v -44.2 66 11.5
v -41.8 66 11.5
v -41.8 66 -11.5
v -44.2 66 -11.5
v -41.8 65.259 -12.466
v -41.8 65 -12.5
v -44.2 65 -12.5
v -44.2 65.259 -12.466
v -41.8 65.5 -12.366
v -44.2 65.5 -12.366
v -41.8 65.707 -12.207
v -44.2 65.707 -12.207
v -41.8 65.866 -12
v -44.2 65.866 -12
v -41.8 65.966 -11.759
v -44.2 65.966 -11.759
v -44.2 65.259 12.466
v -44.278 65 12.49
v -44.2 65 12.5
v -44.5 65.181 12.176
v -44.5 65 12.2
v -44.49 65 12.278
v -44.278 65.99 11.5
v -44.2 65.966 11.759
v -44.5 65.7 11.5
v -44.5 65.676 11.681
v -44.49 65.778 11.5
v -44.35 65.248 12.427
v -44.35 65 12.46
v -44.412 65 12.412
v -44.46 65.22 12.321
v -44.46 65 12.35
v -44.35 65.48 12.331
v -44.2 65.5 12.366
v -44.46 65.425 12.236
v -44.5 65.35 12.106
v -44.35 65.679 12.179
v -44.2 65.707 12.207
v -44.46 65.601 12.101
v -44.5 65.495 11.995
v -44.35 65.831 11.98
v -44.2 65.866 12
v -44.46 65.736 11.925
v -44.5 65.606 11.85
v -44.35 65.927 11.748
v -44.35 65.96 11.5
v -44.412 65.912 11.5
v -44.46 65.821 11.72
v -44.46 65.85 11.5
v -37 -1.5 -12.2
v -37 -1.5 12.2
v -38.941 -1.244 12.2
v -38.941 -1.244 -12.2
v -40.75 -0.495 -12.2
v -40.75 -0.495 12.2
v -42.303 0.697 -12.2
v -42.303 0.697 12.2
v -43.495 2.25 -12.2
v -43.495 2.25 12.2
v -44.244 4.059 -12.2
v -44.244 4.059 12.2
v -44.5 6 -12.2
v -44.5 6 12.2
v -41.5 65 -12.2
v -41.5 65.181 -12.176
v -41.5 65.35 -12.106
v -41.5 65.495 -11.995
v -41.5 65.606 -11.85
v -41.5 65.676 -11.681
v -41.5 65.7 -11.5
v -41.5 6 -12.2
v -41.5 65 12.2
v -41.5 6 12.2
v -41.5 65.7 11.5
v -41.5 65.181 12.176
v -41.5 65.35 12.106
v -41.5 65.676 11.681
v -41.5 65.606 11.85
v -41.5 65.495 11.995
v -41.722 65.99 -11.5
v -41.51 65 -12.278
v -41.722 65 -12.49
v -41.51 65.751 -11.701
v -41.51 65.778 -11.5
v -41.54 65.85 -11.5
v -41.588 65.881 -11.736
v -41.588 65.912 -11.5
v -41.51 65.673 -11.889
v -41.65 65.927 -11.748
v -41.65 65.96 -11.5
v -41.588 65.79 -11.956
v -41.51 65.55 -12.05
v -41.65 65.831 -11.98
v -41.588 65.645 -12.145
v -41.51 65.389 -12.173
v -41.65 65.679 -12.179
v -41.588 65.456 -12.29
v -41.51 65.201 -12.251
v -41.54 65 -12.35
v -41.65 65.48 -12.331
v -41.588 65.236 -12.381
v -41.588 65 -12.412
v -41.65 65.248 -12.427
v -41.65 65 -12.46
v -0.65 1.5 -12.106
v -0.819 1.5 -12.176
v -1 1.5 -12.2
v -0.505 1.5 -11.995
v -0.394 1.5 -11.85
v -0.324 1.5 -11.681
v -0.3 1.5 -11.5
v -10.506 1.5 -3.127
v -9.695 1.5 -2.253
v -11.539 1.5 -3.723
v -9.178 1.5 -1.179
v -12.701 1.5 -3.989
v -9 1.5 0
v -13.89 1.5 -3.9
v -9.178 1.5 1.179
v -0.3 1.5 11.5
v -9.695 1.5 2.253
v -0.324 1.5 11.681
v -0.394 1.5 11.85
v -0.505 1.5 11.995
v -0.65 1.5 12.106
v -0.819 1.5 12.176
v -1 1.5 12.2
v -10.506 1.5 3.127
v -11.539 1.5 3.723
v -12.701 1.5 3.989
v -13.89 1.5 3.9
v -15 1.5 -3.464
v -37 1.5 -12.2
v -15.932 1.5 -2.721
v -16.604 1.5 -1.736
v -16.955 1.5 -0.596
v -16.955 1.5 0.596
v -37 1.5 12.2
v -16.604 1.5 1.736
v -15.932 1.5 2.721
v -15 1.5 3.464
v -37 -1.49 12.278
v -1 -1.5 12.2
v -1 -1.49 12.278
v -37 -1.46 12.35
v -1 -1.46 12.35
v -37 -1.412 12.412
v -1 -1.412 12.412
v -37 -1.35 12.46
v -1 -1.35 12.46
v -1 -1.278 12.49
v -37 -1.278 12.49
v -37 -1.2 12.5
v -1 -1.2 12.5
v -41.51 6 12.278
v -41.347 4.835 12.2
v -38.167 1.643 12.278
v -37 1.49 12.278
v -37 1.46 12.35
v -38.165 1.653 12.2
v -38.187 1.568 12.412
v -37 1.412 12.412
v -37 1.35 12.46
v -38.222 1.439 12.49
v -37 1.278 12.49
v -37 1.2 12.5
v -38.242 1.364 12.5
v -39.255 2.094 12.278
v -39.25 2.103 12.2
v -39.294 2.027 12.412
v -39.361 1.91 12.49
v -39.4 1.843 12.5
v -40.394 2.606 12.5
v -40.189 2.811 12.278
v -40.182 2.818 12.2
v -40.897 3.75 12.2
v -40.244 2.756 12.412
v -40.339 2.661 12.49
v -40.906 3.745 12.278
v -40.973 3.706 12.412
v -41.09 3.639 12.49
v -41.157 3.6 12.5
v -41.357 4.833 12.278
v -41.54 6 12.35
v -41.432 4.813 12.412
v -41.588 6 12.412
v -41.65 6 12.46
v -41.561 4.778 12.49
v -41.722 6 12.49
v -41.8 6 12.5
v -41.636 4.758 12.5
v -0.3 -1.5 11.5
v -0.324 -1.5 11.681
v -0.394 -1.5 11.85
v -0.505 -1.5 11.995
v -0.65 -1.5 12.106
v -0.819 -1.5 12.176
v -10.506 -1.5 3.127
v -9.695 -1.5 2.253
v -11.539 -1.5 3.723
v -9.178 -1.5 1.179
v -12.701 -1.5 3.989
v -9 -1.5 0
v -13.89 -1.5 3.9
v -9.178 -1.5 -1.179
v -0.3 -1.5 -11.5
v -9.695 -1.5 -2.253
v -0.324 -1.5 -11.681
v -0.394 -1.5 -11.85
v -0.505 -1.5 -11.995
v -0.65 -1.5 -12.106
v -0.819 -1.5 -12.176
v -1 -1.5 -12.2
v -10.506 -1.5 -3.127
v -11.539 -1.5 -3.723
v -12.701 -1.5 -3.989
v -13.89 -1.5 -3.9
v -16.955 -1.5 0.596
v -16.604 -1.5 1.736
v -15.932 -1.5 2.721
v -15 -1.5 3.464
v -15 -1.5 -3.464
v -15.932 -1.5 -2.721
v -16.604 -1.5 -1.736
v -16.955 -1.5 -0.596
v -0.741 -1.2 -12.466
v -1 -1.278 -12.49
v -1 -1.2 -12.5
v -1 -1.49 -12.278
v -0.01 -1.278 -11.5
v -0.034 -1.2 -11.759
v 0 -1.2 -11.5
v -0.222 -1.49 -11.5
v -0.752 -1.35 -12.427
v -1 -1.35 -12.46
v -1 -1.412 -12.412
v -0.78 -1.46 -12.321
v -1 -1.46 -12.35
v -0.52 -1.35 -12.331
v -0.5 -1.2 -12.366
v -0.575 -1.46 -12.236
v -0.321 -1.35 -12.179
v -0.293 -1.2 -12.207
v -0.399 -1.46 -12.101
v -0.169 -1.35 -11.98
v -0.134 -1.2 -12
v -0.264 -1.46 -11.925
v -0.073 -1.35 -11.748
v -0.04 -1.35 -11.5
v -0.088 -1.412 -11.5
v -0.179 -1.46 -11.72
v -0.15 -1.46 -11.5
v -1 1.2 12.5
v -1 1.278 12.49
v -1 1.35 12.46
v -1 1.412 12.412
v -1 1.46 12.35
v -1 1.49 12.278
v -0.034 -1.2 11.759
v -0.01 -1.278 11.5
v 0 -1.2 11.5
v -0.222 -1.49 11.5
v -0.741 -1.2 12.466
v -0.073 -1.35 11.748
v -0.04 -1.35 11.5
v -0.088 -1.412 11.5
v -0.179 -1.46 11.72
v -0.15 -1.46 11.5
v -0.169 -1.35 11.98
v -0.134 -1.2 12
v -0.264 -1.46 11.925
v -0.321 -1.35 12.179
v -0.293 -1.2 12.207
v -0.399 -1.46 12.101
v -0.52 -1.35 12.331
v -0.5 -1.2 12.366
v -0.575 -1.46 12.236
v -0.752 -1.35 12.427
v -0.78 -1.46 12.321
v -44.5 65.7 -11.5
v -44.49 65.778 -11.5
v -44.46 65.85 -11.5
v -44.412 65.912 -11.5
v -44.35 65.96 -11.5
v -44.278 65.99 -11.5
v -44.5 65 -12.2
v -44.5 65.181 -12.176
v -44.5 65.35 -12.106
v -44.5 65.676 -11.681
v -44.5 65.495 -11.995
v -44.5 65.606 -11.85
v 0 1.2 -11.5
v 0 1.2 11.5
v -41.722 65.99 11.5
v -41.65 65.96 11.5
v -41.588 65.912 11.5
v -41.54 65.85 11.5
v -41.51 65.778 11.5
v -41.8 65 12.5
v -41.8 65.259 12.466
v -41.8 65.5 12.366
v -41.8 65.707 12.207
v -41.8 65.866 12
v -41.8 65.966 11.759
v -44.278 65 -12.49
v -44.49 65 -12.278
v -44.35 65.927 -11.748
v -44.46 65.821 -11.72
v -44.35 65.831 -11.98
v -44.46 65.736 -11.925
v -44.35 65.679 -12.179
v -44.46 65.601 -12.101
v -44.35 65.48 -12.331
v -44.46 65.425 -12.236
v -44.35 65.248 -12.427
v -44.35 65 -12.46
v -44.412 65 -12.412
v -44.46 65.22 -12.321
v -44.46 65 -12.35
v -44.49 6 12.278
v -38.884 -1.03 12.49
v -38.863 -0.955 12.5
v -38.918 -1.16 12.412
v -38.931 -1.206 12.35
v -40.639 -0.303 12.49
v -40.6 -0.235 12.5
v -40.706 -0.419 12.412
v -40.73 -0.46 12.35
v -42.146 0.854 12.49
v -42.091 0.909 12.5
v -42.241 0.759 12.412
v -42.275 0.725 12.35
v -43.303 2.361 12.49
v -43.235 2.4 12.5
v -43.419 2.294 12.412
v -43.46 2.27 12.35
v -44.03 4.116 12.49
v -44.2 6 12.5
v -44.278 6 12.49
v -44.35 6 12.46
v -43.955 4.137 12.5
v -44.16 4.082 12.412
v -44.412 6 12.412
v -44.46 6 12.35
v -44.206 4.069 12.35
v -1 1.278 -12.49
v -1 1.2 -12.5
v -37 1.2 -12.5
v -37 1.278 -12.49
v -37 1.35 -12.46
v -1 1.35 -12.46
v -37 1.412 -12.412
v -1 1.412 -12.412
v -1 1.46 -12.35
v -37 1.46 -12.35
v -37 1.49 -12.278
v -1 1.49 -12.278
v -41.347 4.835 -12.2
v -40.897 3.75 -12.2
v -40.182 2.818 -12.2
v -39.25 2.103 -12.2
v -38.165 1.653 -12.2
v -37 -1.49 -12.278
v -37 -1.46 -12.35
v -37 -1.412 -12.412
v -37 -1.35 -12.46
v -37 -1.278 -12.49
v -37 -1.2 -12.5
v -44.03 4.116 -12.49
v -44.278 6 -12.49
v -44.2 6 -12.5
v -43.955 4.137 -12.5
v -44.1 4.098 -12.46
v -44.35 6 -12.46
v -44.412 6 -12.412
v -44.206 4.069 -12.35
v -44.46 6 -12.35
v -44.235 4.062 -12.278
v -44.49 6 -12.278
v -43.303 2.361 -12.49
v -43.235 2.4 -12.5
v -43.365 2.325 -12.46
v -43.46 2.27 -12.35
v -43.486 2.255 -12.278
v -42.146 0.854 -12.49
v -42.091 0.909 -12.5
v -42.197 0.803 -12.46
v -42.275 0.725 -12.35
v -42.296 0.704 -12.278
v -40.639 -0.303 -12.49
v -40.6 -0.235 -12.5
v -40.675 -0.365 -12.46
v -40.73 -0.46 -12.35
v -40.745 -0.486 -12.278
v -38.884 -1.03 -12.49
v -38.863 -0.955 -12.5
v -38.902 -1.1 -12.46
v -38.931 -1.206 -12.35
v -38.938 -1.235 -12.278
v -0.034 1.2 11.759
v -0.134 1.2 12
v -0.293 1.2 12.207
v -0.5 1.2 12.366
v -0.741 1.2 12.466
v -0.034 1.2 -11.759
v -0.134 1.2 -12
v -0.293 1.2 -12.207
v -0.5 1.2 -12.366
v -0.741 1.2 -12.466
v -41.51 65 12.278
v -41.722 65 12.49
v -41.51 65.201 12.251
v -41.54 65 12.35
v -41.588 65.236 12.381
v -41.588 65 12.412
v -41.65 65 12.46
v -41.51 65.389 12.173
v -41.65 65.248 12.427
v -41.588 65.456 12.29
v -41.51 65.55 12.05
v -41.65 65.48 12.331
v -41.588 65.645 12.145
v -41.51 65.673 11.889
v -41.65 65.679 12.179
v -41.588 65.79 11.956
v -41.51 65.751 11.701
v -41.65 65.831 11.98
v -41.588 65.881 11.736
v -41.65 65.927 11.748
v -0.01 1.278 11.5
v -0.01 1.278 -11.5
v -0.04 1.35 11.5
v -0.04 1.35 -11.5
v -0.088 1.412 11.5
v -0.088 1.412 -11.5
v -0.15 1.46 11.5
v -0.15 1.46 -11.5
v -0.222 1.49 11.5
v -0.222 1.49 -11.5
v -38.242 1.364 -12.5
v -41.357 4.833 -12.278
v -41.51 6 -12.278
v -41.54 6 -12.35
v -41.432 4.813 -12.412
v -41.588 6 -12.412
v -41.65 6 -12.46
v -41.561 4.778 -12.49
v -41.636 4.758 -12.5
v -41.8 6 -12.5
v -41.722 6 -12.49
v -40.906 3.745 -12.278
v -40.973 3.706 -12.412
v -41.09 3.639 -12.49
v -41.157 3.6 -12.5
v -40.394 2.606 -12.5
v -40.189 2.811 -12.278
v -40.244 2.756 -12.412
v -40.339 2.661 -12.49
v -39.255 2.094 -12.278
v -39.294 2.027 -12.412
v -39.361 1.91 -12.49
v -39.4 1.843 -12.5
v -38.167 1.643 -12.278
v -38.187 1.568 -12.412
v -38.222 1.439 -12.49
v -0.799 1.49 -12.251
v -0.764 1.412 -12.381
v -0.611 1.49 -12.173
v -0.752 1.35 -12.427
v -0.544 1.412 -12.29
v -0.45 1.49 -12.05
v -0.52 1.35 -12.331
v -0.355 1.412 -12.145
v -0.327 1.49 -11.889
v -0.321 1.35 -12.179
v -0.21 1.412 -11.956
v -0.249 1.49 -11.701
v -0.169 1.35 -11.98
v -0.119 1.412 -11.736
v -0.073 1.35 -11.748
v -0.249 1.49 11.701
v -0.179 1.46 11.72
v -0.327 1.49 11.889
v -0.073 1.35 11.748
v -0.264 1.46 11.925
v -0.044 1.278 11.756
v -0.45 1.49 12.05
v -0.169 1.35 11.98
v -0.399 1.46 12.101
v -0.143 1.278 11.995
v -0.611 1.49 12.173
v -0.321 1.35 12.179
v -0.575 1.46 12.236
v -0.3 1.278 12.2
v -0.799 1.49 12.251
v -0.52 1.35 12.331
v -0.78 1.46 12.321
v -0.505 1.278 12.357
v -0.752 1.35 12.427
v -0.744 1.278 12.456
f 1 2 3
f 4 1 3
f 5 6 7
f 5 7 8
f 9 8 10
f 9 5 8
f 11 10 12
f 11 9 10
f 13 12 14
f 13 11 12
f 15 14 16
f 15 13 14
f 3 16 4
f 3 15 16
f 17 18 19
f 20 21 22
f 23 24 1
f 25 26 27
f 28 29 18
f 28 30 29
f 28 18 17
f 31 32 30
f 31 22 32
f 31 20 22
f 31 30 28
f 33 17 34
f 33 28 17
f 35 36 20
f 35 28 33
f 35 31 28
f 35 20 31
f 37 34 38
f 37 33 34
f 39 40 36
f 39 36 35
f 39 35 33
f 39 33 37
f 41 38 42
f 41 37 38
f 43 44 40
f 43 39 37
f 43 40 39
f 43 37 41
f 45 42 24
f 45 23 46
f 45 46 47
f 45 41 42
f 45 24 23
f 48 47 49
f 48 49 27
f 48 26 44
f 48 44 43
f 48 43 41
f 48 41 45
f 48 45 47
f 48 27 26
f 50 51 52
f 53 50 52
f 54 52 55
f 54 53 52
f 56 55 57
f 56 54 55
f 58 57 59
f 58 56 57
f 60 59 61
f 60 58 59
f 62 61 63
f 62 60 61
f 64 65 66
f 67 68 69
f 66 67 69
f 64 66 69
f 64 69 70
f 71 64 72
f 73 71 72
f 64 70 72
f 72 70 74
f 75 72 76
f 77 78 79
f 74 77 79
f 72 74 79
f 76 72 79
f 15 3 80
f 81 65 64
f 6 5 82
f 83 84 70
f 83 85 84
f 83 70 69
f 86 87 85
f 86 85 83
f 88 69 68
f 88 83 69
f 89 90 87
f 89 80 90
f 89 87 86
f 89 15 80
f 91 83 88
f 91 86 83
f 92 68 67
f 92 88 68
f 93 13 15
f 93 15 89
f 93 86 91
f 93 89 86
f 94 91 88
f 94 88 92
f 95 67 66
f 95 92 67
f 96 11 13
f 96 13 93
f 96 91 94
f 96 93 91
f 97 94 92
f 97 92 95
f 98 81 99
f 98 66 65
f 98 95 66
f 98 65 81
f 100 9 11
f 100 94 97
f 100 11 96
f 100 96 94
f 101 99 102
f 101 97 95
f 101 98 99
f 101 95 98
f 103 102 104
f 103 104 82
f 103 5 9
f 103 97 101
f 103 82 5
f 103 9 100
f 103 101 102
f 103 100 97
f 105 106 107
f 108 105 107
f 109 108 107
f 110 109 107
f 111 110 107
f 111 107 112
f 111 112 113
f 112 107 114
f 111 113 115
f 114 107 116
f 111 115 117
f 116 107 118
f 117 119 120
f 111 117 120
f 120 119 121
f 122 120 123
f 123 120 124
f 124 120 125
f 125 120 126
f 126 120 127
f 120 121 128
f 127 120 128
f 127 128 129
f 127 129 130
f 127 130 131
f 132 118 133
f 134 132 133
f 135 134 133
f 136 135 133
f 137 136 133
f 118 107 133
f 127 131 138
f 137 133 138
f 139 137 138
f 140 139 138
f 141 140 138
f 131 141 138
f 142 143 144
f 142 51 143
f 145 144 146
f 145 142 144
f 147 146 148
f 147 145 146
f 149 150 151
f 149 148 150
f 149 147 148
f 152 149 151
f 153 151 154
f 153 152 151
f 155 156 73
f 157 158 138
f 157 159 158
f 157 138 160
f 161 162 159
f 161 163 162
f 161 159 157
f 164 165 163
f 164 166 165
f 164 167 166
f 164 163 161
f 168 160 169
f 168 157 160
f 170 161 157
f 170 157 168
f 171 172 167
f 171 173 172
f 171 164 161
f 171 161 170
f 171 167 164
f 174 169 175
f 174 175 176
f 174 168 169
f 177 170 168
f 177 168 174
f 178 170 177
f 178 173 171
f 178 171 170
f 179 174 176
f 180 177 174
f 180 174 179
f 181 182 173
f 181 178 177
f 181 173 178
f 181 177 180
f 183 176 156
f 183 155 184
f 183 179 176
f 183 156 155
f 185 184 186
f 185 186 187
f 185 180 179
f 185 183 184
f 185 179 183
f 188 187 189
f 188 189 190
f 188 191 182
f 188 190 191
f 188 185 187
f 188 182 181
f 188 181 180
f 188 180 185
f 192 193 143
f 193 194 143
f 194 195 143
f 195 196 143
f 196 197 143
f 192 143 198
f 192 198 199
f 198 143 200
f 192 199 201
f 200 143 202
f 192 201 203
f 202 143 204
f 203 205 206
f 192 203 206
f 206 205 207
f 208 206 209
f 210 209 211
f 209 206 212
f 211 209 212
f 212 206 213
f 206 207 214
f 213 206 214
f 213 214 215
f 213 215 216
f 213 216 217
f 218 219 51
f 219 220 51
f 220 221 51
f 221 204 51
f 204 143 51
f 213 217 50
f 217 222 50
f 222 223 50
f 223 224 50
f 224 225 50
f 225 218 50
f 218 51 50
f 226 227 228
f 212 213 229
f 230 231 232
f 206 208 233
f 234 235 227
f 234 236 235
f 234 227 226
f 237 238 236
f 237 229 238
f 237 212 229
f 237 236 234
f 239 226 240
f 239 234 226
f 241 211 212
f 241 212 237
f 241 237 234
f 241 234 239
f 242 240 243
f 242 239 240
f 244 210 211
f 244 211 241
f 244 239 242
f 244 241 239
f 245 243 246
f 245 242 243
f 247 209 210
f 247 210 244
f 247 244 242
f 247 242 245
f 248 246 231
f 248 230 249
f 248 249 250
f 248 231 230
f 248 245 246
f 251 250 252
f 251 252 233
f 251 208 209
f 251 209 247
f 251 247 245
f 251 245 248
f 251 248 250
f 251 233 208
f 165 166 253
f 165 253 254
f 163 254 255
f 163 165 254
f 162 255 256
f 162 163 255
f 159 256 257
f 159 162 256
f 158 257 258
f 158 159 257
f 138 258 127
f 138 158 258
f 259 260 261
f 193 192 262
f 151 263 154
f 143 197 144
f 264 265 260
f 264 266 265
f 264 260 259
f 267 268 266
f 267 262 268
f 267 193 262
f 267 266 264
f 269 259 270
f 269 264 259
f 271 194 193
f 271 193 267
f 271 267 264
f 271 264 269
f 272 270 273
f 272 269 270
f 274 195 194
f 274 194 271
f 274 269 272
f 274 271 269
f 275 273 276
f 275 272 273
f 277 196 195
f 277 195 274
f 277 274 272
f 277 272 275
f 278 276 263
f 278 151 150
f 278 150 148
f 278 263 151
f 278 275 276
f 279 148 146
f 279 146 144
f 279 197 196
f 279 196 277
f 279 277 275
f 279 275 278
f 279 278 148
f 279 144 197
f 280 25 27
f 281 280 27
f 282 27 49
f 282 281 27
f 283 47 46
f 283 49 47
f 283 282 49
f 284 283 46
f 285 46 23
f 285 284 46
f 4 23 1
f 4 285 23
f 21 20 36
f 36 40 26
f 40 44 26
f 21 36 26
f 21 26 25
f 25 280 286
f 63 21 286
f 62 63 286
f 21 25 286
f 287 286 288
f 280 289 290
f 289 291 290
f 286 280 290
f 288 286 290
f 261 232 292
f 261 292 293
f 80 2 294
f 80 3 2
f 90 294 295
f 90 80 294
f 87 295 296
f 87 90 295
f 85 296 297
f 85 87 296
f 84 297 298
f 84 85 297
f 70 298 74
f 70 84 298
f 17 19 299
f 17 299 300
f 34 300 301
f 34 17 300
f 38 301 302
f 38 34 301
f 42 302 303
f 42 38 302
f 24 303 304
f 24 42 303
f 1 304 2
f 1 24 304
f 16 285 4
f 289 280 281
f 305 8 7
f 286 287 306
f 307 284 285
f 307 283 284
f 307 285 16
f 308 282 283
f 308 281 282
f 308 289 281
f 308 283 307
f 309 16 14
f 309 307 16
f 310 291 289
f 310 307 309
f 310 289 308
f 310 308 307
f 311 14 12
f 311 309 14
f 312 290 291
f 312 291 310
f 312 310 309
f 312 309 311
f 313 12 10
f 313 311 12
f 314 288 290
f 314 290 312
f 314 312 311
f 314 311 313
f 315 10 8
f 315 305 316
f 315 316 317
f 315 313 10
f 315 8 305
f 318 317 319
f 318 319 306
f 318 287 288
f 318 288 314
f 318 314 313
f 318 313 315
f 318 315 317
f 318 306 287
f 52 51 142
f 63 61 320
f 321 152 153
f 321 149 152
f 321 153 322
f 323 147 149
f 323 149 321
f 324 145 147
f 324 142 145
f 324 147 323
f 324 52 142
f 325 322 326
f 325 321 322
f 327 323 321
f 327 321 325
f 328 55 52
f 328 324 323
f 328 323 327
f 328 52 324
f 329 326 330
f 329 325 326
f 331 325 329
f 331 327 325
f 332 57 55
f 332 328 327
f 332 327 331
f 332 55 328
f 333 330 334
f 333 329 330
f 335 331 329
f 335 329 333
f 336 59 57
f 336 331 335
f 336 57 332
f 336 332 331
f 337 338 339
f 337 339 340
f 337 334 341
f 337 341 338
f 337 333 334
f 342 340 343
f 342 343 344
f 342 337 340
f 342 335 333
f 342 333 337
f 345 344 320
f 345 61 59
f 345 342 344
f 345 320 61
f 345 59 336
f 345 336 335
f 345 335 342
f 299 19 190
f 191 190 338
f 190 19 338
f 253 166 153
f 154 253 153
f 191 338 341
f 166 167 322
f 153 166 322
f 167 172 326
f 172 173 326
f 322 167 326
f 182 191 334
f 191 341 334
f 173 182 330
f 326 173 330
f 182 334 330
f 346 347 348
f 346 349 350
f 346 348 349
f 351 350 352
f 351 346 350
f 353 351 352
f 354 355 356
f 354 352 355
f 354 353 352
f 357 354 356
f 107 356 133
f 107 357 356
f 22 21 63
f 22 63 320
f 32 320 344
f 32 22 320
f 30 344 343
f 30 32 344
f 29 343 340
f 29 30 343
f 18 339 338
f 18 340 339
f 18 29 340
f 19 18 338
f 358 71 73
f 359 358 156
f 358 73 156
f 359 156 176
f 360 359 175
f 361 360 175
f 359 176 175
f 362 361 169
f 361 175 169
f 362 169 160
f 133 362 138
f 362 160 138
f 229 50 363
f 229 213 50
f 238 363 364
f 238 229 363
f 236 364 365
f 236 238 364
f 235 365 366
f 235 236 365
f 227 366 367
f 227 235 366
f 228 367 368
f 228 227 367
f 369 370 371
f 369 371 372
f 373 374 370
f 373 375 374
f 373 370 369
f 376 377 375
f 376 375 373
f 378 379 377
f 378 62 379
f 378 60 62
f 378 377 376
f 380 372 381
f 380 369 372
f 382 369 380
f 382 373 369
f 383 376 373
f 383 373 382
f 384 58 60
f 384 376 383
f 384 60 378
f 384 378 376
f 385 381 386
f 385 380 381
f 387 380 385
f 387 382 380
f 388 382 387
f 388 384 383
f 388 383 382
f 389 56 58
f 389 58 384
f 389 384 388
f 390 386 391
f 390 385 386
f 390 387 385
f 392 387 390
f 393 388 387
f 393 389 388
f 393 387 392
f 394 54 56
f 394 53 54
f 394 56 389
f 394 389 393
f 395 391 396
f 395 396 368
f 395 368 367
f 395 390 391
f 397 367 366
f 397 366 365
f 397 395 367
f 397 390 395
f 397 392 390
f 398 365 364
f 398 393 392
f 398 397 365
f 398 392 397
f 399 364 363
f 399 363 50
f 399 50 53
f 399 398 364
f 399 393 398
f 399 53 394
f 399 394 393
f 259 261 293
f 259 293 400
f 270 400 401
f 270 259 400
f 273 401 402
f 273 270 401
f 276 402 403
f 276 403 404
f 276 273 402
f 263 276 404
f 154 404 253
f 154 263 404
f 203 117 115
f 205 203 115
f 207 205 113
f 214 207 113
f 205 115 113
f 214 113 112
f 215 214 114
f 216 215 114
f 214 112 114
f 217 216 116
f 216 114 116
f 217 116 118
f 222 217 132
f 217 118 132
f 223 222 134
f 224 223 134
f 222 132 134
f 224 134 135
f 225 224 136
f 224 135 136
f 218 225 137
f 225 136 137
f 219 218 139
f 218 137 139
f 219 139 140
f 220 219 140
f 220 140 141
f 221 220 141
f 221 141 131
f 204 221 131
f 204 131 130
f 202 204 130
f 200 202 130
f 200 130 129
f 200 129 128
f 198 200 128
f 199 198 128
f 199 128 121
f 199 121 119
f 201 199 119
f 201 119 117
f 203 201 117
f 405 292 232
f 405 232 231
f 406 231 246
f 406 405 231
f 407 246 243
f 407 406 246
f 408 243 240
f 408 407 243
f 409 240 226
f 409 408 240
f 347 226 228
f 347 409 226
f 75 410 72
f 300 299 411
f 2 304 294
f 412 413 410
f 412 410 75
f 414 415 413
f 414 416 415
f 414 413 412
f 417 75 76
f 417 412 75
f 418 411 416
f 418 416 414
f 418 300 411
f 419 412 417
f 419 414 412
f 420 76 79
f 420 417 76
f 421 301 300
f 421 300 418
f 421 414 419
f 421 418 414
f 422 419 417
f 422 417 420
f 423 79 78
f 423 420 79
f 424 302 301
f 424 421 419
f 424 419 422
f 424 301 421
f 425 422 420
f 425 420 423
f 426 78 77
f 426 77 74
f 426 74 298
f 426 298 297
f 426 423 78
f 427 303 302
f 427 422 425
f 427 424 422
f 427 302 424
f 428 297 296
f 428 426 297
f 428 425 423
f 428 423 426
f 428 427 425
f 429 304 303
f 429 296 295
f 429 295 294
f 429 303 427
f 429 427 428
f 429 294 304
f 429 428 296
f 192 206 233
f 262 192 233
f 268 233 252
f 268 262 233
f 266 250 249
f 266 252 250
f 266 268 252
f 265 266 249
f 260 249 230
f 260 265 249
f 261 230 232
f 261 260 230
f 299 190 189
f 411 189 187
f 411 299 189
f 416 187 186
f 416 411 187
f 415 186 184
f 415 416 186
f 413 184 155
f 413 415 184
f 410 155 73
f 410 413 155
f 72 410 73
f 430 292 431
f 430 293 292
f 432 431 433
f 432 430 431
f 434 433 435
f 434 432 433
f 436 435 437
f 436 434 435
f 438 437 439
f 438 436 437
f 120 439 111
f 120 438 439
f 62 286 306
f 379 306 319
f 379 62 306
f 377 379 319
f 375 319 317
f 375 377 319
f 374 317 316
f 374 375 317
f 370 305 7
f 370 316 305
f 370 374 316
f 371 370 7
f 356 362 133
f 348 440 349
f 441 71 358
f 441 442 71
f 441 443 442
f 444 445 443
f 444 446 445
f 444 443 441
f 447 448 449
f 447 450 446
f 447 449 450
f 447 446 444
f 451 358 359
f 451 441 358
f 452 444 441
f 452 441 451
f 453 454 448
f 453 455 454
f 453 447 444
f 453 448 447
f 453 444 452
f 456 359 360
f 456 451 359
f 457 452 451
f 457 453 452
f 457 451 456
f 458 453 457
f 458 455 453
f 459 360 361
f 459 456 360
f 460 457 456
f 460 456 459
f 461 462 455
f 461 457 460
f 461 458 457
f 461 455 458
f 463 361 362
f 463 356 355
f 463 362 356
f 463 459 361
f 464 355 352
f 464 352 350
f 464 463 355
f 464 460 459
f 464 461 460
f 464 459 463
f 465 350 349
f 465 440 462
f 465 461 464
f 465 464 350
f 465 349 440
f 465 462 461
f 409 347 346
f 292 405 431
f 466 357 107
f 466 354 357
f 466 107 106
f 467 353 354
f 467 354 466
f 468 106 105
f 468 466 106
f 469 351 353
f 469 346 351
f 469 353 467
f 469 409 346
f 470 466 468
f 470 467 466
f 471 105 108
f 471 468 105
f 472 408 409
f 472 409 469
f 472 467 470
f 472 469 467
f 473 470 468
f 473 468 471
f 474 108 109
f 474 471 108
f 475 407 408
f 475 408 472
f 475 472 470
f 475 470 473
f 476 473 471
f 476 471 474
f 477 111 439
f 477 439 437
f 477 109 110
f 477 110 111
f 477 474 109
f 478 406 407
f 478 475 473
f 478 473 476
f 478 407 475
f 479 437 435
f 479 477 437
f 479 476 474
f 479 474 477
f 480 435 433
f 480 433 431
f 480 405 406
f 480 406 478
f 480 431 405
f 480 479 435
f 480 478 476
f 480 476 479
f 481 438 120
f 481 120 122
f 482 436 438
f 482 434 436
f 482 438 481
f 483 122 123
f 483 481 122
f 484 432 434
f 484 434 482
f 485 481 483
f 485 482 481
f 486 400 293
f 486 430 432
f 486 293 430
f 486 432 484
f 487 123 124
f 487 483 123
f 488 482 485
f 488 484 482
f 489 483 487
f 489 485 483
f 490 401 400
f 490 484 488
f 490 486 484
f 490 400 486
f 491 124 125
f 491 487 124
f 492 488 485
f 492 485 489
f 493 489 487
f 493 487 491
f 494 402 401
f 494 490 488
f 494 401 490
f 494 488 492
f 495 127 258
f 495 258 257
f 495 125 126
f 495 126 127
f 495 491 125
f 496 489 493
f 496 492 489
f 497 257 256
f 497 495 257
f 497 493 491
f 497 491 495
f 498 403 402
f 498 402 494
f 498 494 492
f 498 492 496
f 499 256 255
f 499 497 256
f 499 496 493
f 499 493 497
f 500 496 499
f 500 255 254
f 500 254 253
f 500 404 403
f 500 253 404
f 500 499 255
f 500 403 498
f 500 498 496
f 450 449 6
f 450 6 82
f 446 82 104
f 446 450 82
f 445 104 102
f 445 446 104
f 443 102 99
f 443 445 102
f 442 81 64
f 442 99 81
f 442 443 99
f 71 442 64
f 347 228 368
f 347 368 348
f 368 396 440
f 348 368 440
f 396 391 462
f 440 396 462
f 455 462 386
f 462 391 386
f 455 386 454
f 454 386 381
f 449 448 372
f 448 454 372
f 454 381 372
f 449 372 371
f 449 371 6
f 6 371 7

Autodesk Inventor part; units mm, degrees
ref_plane "YZ Plane" through (0, 0, 0) normal (1, 0, 0) x (0, 1, 0)
ref_plane "XZ Plane" through (0, 0, 0) normal (0, 1, 0) x (-1, 0, 0)
ref_plane "XY Plane" through (0, 0, 0) normal (0, 0, 1) x (1, 0, 0)
sketch "Sketch1" plane through (0, 0, 0) normal (0, 0, 1) x (1, 0, 0)
  line L0 (0, 0) -> (-37, 0)
  line L1 (-43, 6) -> (-43, 66)
  arc A0 (-43, 6) -> (-37, 0) centre (-37, 6) ccw
  point P0 (-43, 0)
  dimension "d0" = 43
  dimension "d1" = 66
  dimension "d2" = 6
sketch "Sketch2" plane through (0, 0, 0) normal (1, 0, 0) x (0, 1, 0)
  line L0 (-1.5, -12.5) -> (1.5, -12.5)
  line L1 (1.5, -12.5) -> (1.5, 12.5)
  line L2 (1.5, 12.5) -> (-1.5, 12.5)
  line L3 (-1.5, 12.5) -> (-1.5, -12.5)
  line L4 (-1.5, -12.5) -> (1.5, 12.5) construction
  line L5 (1.5, -12.5) -> (-1.5, 12.5) construction
  point P0 (0, 0)
  dimension "d3" = 3
  dimension "d4" = 25
sweep "Sweep1" add profiles "Sketch2" path "Sketch1"
sketch "Sketch3" plane through (0, 1.5, 12.5) normal (0, 1, 0) x (1, 0, 0)
  circle A0 centre (-13, 12.5) radius 4
  line L0 (0, 25) -> (0, 0) projected
  point P0 (0, 12.5)
  point P1 (0, 12.5)
  point P2 (0, 12.5)
  dimension "d7" = 8
  dimension "d8" = 13
extrude "Extrusion1" cut sketch "Sketch3" against normal through all
thread "Thread1"
fillet "Fillet1" radius 1 4 edges at (-43, 66, 12.5) (0, 0, 12.5) (0, 0, -12.5) (-43, 66, -12.5)
fillet "Fillet2" radius 0.3 24 edges at (-44.5, 65.7071, 12.2071) (-44.5, 66, 0) (-44.5, 65.7071, -12.2071) (-19, -1.5, -12.5) (-42.3033, 0.6967, -12.5) (-44.5, 35.5, -12.5) (-0.2929, -1.5, -12.2071) (0, -1.5, 0) (-0.2929, -1.5, 12.2071) (-19, -1.5, 12.5) (-42.3033, 0.6967, 12.5) (-44.5, 35.5, 12.5) (-41.5, 65.7071, 12.2071) (-41.5, 66, 0) (-41.5, 65.7071, -12.2071) (-19, 1.5, -12.5) (-40.182, 2.818, -12.5) (-41.5, 35.5, -12.5) (-0.2929, 1.5, -12.2071) (0, 1.5, 0) (-0.2929, 1.5, 12.2071) (-19, 1.5, 12.5) (-40.182, 2.818, 12.5) (-41.5, 35.5, 12.5)
properties part number "clampBaseBottom" material "Steel"
